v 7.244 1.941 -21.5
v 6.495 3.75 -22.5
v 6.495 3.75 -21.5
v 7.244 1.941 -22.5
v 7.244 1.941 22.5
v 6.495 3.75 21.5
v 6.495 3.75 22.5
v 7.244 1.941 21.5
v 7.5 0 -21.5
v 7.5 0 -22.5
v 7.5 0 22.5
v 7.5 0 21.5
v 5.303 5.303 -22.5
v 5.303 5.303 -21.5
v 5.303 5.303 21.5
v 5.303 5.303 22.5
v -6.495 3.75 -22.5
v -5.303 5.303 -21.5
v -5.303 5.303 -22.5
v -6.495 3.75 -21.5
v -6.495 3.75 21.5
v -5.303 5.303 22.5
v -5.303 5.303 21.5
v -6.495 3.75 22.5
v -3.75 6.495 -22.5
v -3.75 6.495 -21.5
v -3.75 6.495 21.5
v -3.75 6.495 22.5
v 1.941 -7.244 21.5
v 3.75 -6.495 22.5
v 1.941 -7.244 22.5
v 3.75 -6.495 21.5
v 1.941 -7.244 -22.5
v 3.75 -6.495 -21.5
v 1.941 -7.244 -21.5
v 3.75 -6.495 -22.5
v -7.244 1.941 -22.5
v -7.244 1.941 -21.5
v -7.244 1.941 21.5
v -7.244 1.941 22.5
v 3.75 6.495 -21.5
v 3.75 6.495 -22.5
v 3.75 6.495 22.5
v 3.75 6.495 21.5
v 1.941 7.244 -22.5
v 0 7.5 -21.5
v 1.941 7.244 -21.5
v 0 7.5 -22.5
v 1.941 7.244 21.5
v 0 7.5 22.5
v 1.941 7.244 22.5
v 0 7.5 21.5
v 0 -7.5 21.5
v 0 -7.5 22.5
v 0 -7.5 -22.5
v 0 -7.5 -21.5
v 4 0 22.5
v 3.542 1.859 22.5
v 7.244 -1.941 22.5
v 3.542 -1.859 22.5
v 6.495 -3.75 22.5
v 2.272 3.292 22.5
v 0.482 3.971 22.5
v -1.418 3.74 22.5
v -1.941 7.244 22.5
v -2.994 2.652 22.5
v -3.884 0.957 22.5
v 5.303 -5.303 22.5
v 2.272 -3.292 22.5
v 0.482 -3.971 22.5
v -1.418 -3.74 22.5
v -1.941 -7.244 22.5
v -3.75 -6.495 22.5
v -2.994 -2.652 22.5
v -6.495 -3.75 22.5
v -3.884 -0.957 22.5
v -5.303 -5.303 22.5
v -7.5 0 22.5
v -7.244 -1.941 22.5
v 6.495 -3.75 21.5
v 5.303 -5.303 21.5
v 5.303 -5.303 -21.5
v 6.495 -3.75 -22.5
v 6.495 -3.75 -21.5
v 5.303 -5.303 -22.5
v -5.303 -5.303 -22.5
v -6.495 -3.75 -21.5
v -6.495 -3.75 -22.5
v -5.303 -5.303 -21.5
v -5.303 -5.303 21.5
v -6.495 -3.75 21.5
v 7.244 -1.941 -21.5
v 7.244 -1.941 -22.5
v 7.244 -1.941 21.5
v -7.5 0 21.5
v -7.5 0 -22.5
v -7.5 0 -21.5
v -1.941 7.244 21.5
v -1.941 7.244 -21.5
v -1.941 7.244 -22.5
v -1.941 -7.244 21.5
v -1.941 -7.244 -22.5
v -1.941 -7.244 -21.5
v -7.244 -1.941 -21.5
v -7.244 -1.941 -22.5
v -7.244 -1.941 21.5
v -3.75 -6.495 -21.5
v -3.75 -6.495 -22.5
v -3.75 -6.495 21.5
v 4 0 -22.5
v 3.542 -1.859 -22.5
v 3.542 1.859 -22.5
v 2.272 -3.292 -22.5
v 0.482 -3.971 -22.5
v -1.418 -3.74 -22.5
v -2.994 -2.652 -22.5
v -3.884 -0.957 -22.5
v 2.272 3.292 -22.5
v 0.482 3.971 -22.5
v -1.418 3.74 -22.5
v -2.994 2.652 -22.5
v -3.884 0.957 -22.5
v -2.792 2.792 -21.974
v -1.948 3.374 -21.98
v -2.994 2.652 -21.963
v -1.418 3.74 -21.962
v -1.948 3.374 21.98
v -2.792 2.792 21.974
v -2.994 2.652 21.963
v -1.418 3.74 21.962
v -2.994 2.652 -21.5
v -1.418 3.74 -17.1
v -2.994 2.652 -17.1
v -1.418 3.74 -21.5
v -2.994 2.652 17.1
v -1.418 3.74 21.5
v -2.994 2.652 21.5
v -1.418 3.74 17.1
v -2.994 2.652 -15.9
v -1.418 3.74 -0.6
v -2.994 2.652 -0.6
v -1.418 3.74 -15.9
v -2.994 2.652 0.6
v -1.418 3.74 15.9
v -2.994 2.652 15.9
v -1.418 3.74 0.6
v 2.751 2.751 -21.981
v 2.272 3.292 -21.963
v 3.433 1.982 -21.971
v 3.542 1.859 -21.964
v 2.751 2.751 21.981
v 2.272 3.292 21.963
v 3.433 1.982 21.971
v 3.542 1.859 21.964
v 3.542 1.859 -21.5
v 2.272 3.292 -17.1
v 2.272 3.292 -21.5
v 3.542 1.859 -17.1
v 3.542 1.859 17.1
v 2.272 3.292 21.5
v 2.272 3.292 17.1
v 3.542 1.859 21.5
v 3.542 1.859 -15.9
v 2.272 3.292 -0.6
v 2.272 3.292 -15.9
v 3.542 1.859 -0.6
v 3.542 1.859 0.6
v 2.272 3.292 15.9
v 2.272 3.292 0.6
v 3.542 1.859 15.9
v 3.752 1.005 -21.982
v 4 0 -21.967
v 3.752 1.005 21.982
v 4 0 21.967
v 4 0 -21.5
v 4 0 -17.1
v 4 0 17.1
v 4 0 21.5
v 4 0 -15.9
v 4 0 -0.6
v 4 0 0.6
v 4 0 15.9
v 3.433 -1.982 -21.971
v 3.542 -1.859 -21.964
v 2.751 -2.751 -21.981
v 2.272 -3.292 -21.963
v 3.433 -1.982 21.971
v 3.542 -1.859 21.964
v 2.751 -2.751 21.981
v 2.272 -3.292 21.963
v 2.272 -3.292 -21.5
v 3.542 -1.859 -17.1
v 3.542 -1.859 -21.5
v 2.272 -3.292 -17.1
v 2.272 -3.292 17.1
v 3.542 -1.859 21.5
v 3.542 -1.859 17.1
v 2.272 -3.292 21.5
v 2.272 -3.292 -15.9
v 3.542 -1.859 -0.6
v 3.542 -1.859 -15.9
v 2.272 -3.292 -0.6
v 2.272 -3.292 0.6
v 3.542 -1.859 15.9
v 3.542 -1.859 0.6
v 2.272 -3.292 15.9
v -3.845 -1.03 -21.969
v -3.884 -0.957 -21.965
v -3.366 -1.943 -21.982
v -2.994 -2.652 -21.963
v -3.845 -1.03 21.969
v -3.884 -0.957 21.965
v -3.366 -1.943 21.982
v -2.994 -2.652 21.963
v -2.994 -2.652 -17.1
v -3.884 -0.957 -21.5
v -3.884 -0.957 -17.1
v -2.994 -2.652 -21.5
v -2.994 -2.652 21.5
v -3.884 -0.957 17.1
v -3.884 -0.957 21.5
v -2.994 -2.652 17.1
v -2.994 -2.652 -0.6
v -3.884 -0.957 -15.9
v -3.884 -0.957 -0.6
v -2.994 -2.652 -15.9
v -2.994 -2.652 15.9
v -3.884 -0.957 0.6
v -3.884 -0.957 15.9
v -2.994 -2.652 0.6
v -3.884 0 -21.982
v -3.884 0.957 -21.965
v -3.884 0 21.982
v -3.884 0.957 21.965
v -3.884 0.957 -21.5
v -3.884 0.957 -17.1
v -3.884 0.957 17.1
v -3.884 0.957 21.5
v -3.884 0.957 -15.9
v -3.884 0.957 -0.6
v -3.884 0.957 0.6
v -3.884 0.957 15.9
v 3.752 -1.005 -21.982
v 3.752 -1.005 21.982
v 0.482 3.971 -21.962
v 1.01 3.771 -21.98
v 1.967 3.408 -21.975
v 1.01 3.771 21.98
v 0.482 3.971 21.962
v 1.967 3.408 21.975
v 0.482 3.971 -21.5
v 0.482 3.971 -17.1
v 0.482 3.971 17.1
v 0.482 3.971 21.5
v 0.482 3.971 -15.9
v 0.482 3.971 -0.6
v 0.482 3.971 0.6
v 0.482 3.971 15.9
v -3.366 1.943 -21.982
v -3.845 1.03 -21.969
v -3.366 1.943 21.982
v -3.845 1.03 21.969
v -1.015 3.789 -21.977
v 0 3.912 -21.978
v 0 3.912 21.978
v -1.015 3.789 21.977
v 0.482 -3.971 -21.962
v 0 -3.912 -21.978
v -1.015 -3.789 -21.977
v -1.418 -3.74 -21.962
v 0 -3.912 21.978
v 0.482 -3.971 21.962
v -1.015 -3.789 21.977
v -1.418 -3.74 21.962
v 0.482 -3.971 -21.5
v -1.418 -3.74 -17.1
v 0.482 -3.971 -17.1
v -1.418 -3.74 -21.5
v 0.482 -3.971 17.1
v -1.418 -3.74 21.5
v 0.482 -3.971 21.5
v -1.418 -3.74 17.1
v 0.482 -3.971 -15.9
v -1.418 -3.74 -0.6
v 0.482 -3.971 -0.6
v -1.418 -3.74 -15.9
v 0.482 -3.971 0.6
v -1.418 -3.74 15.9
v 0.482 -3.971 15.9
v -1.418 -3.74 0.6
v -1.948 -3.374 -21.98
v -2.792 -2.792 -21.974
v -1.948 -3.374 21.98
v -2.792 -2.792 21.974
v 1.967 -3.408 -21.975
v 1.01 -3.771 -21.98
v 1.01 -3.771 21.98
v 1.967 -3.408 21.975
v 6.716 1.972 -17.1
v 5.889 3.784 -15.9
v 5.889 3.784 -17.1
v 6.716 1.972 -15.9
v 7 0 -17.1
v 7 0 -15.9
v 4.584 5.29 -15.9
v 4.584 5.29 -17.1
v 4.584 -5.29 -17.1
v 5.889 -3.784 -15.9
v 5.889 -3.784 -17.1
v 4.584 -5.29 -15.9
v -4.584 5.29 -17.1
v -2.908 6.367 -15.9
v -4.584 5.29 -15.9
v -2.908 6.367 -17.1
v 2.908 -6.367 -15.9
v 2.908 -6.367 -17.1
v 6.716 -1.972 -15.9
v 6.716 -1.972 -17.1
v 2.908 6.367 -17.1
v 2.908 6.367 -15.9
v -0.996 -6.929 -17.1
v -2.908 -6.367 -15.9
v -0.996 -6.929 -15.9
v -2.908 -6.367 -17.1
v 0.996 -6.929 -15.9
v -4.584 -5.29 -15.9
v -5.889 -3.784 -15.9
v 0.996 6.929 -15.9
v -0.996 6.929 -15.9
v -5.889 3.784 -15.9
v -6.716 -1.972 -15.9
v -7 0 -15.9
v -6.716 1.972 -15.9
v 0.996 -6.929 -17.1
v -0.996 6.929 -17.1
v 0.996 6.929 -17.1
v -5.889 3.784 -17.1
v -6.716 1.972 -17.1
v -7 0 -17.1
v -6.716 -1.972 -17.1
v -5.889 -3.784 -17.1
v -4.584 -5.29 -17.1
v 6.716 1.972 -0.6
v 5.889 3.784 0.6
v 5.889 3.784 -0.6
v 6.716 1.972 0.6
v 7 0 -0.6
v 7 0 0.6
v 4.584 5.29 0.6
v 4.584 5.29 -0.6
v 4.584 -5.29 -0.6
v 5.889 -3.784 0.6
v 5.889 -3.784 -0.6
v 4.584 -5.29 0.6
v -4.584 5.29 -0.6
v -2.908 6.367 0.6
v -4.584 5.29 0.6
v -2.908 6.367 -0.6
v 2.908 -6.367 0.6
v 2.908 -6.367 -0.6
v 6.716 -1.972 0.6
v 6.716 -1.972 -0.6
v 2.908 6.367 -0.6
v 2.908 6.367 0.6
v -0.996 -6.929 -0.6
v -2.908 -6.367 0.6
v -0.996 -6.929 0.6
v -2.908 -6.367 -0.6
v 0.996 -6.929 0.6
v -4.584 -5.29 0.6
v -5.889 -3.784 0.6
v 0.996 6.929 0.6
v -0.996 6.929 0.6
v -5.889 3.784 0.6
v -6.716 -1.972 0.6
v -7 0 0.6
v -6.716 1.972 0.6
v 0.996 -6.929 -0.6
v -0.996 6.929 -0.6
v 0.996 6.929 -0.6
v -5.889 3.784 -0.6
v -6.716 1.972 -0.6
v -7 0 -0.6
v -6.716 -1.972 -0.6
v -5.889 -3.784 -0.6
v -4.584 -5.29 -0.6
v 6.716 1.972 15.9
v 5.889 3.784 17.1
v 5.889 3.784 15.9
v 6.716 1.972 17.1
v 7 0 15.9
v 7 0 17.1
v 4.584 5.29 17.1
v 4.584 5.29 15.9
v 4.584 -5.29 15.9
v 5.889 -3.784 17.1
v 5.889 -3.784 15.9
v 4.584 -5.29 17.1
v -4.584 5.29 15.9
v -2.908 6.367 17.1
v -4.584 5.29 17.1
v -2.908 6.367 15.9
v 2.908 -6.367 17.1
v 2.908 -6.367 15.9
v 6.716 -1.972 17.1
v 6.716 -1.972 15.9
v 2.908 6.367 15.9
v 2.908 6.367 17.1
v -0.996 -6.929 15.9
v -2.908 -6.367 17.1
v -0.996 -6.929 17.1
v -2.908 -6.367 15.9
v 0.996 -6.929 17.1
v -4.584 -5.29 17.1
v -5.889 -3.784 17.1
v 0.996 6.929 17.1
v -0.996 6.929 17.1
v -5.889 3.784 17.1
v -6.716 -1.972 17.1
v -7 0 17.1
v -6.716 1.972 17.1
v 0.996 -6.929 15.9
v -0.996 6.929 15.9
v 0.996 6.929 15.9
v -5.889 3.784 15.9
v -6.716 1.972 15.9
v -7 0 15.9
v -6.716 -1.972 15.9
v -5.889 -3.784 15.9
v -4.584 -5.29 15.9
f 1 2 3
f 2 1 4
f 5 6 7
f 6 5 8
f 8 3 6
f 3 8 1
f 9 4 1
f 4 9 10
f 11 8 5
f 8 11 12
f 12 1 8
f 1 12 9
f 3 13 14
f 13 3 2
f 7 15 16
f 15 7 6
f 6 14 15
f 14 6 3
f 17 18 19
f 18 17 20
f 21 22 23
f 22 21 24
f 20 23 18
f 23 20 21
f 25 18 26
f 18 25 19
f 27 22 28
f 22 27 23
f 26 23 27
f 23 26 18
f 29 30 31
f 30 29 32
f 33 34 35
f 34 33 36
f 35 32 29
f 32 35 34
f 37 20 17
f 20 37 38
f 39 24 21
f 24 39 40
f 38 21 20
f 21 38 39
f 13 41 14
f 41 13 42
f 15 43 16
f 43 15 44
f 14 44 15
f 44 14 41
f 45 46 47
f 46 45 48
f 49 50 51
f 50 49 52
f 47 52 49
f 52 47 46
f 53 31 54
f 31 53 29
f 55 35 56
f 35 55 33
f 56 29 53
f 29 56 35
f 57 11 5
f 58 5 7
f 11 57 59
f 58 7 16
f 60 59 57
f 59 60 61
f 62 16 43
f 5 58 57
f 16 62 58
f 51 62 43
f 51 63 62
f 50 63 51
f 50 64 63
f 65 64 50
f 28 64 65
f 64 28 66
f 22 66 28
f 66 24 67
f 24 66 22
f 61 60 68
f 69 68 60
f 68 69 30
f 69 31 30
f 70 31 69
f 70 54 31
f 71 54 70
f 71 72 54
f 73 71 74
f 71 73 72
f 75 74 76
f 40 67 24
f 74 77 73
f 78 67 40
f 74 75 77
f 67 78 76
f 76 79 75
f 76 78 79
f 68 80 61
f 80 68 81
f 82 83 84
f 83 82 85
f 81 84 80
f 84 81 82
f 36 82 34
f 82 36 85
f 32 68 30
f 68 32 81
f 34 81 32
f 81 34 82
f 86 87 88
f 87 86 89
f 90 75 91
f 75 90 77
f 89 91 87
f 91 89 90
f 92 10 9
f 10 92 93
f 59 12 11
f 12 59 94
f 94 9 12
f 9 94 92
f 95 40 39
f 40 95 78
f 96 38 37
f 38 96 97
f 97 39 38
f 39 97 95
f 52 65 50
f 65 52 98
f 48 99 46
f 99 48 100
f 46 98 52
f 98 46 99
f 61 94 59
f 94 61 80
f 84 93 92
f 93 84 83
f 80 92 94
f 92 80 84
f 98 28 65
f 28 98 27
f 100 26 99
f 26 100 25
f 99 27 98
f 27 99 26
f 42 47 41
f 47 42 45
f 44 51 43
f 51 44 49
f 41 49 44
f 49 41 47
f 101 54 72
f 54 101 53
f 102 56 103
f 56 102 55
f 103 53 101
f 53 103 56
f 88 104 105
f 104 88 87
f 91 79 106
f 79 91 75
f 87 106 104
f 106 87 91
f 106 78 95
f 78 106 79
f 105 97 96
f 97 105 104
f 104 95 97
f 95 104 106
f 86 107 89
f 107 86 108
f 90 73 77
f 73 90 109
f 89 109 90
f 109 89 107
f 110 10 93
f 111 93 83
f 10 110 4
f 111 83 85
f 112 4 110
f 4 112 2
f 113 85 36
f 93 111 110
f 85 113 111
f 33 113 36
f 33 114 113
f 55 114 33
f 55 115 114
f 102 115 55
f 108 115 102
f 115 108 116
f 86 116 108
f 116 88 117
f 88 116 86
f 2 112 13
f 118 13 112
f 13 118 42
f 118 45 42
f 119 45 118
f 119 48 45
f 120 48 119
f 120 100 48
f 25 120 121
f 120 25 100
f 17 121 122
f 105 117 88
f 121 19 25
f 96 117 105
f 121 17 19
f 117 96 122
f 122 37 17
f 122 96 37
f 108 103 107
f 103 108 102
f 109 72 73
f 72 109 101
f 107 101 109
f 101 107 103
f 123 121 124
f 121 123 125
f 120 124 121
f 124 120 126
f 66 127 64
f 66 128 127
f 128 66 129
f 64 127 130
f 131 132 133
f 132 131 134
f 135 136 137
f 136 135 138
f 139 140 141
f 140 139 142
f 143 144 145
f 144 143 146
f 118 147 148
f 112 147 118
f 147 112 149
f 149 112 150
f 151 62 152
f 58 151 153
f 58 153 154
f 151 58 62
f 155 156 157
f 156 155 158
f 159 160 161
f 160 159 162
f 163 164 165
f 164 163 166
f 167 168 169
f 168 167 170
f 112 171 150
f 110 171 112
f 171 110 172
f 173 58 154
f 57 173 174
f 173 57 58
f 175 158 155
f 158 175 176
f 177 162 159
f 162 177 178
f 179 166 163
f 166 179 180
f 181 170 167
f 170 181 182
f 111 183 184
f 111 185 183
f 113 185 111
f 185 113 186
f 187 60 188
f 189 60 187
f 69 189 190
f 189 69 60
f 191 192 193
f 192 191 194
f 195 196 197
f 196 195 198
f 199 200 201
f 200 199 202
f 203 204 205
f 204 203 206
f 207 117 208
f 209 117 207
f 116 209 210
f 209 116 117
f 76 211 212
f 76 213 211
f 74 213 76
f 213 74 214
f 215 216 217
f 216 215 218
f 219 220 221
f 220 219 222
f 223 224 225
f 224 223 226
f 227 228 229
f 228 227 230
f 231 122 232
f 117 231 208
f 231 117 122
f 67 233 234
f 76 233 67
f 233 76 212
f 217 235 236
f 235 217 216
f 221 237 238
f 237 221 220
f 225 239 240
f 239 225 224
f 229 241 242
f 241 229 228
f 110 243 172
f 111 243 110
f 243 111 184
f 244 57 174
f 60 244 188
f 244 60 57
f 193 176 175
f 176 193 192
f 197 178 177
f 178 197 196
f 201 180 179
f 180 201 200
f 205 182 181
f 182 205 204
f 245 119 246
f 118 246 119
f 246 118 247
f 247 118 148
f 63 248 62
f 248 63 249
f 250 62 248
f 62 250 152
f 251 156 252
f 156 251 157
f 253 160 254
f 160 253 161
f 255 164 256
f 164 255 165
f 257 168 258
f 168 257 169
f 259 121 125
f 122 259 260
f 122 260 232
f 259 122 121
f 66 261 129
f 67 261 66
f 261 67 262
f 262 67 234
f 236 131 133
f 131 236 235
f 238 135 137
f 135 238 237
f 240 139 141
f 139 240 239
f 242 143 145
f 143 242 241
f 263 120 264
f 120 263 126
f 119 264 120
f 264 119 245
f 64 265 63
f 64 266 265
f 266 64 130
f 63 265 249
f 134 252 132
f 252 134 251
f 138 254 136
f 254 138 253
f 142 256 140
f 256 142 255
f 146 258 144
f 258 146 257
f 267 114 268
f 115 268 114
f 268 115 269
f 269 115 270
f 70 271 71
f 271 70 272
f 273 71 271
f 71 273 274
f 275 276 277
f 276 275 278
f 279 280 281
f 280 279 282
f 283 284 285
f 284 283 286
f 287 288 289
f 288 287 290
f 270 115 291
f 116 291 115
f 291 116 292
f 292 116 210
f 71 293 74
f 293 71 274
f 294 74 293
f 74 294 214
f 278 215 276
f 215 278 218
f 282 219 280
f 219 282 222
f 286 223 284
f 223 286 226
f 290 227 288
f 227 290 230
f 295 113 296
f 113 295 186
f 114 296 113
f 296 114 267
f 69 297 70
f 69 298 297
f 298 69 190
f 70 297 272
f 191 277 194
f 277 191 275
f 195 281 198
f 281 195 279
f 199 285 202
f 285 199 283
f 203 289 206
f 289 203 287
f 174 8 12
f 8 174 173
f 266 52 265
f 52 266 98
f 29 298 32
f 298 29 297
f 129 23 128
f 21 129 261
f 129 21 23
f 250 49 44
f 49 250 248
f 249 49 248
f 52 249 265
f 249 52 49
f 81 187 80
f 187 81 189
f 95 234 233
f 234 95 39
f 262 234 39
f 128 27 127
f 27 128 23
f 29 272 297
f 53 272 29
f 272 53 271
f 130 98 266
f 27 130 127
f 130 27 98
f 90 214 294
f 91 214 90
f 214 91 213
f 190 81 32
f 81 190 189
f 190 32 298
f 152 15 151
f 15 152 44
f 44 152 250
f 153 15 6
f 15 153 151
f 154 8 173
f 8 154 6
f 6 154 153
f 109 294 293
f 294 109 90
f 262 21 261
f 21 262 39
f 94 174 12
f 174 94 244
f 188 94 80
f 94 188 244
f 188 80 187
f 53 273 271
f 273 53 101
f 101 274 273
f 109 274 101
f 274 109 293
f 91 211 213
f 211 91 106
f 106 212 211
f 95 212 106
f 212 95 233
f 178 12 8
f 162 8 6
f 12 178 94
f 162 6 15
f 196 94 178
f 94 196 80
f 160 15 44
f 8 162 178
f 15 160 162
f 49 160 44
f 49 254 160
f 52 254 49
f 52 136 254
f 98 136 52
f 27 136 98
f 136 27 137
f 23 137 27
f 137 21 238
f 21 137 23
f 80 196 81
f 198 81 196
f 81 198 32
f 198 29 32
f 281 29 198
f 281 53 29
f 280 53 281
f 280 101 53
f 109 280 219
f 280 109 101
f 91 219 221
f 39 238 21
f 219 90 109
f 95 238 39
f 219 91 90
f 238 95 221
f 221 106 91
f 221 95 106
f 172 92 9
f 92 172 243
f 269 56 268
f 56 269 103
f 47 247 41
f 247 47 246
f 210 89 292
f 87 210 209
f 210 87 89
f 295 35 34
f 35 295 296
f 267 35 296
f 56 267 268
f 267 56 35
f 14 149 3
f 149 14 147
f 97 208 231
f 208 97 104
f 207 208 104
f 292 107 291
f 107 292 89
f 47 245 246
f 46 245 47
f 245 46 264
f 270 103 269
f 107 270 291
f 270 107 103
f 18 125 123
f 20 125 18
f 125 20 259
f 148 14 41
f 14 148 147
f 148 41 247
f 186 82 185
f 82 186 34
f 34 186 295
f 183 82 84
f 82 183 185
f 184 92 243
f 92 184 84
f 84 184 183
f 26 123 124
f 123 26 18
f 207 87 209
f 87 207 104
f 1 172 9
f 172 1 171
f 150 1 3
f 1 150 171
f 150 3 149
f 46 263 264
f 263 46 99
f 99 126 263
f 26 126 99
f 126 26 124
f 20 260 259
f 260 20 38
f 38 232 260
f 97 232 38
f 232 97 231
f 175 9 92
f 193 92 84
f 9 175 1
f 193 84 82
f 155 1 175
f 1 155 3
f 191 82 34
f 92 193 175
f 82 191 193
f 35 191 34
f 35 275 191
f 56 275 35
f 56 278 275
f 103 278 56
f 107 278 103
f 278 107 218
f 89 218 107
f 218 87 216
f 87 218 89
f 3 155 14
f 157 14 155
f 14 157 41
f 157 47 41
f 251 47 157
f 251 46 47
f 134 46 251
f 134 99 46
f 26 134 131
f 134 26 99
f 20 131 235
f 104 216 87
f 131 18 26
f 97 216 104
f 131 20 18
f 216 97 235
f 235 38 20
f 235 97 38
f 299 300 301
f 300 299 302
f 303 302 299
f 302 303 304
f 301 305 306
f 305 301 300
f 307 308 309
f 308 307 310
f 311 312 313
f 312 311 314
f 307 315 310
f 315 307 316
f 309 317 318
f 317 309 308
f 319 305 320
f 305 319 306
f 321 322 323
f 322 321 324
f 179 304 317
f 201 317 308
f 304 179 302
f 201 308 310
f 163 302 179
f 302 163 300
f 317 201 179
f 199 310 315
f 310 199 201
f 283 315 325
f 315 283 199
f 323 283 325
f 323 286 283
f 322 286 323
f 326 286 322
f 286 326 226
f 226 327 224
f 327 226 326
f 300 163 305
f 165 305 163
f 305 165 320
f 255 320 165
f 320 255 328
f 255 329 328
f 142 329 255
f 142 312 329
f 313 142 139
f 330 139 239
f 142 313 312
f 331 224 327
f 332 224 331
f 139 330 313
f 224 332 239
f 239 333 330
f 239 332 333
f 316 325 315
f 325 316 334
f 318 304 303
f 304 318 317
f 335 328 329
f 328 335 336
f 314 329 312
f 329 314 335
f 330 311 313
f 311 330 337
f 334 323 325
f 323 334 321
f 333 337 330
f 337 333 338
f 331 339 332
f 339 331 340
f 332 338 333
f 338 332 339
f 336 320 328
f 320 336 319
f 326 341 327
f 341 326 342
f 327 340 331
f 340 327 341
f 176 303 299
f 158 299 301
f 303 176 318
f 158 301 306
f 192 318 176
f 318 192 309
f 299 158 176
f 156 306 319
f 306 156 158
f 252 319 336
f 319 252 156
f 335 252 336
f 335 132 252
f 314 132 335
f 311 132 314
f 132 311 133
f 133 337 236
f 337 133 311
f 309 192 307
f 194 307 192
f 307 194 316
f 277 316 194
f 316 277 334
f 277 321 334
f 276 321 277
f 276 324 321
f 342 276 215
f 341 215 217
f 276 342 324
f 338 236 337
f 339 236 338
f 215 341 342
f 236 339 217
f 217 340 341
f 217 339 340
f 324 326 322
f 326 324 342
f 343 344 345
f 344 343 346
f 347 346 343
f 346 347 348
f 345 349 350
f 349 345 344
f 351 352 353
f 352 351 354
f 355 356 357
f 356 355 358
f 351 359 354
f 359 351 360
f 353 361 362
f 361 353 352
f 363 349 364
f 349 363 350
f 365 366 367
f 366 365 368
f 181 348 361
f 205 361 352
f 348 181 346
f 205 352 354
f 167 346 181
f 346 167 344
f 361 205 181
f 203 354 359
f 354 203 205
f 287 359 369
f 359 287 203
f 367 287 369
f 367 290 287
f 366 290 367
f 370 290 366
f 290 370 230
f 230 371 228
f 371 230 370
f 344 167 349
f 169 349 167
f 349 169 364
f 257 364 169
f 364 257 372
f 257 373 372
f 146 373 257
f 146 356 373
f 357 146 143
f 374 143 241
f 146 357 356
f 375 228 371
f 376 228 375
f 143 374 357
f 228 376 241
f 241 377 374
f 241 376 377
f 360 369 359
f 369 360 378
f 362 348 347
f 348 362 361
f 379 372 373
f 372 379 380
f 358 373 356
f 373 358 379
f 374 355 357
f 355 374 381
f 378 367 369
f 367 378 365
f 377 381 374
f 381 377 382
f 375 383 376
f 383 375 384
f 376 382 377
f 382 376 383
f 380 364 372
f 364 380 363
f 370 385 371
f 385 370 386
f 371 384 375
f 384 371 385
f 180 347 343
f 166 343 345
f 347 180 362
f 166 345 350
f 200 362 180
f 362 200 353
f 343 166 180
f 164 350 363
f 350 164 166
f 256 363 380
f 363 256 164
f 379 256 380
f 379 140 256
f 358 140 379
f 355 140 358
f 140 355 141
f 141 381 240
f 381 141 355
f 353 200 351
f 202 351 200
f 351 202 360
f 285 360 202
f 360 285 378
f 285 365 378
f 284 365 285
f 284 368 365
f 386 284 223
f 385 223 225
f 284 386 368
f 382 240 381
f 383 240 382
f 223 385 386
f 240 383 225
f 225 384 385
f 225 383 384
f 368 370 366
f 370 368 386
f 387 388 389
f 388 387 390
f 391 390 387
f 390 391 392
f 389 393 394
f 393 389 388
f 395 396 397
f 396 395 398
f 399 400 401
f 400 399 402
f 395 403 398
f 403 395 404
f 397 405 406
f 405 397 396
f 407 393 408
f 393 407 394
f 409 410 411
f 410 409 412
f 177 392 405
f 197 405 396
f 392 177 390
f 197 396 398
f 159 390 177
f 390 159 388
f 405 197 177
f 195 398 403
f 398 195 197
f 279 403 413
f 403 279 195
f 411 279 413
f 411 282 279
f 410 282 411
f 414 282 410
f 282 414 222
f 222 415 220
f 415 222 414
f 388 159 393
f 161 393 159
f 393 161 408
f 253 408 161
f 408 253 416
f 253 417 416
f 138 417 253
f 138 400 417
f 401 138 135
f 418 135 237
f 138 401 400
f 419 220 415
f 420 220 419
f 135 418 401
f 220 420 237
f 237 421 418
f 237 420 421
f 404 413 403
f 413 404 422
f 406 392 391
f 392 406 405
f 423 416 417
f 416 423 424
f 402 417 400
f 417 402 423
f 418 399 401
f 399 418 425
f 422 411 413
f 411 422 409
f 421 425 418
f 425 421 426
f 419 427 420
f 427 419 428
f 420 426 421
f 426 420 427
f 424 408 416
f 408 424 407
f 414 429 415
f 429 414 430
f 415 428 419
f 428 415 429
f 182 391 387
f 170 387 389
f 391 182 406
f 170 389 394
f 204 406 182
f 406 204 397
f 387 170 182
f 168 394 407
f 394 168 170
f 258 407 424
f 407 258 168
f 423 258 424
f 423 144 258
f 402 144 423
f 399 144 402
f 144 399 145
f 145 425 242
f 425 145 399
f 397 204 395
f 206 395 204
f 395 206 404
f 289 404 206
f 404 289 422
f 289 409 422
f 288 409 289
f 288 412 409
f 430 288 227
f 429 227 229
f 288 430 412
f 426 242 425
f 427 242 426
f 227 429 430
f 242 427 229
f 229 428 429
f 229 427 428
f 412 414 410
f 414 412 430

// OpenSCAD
// Parameters
bearing_length = 45.0; //[22.5:90.0:0.5]
outer_diameter = 15.0; //[7.5:30.0:0.1]
inner_diameter = 8.0; //[4.0:16.0:0.1]
chamfer_depth = 1.0; //[0.5:2.0:0.1]
chamfer_radial = 0.8; //[0.4:1.6:0.1]
groove_count = 3; //[1:6:1]
groove_width = 1.2; //[0.6:2.4:0.1]
groove_depth = 0.5; //[0.2:1.2:0.1]
groove_margin = 6.0; //[3.0:12.0:0.5]
bore_extra_length = 2.0; //[1.0:6.0:0.5]

// Base Shapes
module bearing_outer_cylinder() {
  cylinder(h=bearing_length, r=outer_diameter/2, center=true);
}

module bearing_inner_bore() {
  cylinder(h=bearing_length + bore_extra_length, r=inner_diameter/2, center=true);
}

module end_chamfer_top_cutter() {
  translate([0, 0, bearing_length/2 - chamfer_depth/2])
    cylinder(h=chamfer_depth, r1=outer_diameter/2, r2=0, center=true);
}

module end_chamfer_bottom_cutter() {
  translate([0, 0, -bearing_length/2 + chamfer_depth/2])
    rotate([180, 0, 0])
    cylinder(h=chamfer_depth, r1=outer_diameter/2, r2=0, center=true);
}

module outer_groove(position_z) {
  translate([0, 0, position_z])
    cylinder(h=groove_width, r=outer_diameter/2 - groove_depth, center=true);
}

// Operations
module end_chamfers() {
  union() {
    end_chamfer_top_cutter();
    end_chamfer_bottom_cutter();
  }
}

module outer_surface_grooves() {
  union() {
    outer_groove(-(bearing_length/2 - groove_margin));
    outer_groove(0);
    outer_groove(bearing_length/2 - groove_margin);
  }
}

module bearing_shell_pre_chamfer() {
  difference() {
    bearing_outer_cylinder();
    bearing_inner_bore();
  }
}

module bearing_shell_with_chamfers() {
  difference() {
    bearing_shell_pre_chamfer();
    end_chamfers();
  }
}

module bearing_complete_model() {
  difference() {
    bearing_shell_with_chamfers();
    outer_surface_grooves();
  }
}

// Final Output
color("Silver") bearing_complete_model();
